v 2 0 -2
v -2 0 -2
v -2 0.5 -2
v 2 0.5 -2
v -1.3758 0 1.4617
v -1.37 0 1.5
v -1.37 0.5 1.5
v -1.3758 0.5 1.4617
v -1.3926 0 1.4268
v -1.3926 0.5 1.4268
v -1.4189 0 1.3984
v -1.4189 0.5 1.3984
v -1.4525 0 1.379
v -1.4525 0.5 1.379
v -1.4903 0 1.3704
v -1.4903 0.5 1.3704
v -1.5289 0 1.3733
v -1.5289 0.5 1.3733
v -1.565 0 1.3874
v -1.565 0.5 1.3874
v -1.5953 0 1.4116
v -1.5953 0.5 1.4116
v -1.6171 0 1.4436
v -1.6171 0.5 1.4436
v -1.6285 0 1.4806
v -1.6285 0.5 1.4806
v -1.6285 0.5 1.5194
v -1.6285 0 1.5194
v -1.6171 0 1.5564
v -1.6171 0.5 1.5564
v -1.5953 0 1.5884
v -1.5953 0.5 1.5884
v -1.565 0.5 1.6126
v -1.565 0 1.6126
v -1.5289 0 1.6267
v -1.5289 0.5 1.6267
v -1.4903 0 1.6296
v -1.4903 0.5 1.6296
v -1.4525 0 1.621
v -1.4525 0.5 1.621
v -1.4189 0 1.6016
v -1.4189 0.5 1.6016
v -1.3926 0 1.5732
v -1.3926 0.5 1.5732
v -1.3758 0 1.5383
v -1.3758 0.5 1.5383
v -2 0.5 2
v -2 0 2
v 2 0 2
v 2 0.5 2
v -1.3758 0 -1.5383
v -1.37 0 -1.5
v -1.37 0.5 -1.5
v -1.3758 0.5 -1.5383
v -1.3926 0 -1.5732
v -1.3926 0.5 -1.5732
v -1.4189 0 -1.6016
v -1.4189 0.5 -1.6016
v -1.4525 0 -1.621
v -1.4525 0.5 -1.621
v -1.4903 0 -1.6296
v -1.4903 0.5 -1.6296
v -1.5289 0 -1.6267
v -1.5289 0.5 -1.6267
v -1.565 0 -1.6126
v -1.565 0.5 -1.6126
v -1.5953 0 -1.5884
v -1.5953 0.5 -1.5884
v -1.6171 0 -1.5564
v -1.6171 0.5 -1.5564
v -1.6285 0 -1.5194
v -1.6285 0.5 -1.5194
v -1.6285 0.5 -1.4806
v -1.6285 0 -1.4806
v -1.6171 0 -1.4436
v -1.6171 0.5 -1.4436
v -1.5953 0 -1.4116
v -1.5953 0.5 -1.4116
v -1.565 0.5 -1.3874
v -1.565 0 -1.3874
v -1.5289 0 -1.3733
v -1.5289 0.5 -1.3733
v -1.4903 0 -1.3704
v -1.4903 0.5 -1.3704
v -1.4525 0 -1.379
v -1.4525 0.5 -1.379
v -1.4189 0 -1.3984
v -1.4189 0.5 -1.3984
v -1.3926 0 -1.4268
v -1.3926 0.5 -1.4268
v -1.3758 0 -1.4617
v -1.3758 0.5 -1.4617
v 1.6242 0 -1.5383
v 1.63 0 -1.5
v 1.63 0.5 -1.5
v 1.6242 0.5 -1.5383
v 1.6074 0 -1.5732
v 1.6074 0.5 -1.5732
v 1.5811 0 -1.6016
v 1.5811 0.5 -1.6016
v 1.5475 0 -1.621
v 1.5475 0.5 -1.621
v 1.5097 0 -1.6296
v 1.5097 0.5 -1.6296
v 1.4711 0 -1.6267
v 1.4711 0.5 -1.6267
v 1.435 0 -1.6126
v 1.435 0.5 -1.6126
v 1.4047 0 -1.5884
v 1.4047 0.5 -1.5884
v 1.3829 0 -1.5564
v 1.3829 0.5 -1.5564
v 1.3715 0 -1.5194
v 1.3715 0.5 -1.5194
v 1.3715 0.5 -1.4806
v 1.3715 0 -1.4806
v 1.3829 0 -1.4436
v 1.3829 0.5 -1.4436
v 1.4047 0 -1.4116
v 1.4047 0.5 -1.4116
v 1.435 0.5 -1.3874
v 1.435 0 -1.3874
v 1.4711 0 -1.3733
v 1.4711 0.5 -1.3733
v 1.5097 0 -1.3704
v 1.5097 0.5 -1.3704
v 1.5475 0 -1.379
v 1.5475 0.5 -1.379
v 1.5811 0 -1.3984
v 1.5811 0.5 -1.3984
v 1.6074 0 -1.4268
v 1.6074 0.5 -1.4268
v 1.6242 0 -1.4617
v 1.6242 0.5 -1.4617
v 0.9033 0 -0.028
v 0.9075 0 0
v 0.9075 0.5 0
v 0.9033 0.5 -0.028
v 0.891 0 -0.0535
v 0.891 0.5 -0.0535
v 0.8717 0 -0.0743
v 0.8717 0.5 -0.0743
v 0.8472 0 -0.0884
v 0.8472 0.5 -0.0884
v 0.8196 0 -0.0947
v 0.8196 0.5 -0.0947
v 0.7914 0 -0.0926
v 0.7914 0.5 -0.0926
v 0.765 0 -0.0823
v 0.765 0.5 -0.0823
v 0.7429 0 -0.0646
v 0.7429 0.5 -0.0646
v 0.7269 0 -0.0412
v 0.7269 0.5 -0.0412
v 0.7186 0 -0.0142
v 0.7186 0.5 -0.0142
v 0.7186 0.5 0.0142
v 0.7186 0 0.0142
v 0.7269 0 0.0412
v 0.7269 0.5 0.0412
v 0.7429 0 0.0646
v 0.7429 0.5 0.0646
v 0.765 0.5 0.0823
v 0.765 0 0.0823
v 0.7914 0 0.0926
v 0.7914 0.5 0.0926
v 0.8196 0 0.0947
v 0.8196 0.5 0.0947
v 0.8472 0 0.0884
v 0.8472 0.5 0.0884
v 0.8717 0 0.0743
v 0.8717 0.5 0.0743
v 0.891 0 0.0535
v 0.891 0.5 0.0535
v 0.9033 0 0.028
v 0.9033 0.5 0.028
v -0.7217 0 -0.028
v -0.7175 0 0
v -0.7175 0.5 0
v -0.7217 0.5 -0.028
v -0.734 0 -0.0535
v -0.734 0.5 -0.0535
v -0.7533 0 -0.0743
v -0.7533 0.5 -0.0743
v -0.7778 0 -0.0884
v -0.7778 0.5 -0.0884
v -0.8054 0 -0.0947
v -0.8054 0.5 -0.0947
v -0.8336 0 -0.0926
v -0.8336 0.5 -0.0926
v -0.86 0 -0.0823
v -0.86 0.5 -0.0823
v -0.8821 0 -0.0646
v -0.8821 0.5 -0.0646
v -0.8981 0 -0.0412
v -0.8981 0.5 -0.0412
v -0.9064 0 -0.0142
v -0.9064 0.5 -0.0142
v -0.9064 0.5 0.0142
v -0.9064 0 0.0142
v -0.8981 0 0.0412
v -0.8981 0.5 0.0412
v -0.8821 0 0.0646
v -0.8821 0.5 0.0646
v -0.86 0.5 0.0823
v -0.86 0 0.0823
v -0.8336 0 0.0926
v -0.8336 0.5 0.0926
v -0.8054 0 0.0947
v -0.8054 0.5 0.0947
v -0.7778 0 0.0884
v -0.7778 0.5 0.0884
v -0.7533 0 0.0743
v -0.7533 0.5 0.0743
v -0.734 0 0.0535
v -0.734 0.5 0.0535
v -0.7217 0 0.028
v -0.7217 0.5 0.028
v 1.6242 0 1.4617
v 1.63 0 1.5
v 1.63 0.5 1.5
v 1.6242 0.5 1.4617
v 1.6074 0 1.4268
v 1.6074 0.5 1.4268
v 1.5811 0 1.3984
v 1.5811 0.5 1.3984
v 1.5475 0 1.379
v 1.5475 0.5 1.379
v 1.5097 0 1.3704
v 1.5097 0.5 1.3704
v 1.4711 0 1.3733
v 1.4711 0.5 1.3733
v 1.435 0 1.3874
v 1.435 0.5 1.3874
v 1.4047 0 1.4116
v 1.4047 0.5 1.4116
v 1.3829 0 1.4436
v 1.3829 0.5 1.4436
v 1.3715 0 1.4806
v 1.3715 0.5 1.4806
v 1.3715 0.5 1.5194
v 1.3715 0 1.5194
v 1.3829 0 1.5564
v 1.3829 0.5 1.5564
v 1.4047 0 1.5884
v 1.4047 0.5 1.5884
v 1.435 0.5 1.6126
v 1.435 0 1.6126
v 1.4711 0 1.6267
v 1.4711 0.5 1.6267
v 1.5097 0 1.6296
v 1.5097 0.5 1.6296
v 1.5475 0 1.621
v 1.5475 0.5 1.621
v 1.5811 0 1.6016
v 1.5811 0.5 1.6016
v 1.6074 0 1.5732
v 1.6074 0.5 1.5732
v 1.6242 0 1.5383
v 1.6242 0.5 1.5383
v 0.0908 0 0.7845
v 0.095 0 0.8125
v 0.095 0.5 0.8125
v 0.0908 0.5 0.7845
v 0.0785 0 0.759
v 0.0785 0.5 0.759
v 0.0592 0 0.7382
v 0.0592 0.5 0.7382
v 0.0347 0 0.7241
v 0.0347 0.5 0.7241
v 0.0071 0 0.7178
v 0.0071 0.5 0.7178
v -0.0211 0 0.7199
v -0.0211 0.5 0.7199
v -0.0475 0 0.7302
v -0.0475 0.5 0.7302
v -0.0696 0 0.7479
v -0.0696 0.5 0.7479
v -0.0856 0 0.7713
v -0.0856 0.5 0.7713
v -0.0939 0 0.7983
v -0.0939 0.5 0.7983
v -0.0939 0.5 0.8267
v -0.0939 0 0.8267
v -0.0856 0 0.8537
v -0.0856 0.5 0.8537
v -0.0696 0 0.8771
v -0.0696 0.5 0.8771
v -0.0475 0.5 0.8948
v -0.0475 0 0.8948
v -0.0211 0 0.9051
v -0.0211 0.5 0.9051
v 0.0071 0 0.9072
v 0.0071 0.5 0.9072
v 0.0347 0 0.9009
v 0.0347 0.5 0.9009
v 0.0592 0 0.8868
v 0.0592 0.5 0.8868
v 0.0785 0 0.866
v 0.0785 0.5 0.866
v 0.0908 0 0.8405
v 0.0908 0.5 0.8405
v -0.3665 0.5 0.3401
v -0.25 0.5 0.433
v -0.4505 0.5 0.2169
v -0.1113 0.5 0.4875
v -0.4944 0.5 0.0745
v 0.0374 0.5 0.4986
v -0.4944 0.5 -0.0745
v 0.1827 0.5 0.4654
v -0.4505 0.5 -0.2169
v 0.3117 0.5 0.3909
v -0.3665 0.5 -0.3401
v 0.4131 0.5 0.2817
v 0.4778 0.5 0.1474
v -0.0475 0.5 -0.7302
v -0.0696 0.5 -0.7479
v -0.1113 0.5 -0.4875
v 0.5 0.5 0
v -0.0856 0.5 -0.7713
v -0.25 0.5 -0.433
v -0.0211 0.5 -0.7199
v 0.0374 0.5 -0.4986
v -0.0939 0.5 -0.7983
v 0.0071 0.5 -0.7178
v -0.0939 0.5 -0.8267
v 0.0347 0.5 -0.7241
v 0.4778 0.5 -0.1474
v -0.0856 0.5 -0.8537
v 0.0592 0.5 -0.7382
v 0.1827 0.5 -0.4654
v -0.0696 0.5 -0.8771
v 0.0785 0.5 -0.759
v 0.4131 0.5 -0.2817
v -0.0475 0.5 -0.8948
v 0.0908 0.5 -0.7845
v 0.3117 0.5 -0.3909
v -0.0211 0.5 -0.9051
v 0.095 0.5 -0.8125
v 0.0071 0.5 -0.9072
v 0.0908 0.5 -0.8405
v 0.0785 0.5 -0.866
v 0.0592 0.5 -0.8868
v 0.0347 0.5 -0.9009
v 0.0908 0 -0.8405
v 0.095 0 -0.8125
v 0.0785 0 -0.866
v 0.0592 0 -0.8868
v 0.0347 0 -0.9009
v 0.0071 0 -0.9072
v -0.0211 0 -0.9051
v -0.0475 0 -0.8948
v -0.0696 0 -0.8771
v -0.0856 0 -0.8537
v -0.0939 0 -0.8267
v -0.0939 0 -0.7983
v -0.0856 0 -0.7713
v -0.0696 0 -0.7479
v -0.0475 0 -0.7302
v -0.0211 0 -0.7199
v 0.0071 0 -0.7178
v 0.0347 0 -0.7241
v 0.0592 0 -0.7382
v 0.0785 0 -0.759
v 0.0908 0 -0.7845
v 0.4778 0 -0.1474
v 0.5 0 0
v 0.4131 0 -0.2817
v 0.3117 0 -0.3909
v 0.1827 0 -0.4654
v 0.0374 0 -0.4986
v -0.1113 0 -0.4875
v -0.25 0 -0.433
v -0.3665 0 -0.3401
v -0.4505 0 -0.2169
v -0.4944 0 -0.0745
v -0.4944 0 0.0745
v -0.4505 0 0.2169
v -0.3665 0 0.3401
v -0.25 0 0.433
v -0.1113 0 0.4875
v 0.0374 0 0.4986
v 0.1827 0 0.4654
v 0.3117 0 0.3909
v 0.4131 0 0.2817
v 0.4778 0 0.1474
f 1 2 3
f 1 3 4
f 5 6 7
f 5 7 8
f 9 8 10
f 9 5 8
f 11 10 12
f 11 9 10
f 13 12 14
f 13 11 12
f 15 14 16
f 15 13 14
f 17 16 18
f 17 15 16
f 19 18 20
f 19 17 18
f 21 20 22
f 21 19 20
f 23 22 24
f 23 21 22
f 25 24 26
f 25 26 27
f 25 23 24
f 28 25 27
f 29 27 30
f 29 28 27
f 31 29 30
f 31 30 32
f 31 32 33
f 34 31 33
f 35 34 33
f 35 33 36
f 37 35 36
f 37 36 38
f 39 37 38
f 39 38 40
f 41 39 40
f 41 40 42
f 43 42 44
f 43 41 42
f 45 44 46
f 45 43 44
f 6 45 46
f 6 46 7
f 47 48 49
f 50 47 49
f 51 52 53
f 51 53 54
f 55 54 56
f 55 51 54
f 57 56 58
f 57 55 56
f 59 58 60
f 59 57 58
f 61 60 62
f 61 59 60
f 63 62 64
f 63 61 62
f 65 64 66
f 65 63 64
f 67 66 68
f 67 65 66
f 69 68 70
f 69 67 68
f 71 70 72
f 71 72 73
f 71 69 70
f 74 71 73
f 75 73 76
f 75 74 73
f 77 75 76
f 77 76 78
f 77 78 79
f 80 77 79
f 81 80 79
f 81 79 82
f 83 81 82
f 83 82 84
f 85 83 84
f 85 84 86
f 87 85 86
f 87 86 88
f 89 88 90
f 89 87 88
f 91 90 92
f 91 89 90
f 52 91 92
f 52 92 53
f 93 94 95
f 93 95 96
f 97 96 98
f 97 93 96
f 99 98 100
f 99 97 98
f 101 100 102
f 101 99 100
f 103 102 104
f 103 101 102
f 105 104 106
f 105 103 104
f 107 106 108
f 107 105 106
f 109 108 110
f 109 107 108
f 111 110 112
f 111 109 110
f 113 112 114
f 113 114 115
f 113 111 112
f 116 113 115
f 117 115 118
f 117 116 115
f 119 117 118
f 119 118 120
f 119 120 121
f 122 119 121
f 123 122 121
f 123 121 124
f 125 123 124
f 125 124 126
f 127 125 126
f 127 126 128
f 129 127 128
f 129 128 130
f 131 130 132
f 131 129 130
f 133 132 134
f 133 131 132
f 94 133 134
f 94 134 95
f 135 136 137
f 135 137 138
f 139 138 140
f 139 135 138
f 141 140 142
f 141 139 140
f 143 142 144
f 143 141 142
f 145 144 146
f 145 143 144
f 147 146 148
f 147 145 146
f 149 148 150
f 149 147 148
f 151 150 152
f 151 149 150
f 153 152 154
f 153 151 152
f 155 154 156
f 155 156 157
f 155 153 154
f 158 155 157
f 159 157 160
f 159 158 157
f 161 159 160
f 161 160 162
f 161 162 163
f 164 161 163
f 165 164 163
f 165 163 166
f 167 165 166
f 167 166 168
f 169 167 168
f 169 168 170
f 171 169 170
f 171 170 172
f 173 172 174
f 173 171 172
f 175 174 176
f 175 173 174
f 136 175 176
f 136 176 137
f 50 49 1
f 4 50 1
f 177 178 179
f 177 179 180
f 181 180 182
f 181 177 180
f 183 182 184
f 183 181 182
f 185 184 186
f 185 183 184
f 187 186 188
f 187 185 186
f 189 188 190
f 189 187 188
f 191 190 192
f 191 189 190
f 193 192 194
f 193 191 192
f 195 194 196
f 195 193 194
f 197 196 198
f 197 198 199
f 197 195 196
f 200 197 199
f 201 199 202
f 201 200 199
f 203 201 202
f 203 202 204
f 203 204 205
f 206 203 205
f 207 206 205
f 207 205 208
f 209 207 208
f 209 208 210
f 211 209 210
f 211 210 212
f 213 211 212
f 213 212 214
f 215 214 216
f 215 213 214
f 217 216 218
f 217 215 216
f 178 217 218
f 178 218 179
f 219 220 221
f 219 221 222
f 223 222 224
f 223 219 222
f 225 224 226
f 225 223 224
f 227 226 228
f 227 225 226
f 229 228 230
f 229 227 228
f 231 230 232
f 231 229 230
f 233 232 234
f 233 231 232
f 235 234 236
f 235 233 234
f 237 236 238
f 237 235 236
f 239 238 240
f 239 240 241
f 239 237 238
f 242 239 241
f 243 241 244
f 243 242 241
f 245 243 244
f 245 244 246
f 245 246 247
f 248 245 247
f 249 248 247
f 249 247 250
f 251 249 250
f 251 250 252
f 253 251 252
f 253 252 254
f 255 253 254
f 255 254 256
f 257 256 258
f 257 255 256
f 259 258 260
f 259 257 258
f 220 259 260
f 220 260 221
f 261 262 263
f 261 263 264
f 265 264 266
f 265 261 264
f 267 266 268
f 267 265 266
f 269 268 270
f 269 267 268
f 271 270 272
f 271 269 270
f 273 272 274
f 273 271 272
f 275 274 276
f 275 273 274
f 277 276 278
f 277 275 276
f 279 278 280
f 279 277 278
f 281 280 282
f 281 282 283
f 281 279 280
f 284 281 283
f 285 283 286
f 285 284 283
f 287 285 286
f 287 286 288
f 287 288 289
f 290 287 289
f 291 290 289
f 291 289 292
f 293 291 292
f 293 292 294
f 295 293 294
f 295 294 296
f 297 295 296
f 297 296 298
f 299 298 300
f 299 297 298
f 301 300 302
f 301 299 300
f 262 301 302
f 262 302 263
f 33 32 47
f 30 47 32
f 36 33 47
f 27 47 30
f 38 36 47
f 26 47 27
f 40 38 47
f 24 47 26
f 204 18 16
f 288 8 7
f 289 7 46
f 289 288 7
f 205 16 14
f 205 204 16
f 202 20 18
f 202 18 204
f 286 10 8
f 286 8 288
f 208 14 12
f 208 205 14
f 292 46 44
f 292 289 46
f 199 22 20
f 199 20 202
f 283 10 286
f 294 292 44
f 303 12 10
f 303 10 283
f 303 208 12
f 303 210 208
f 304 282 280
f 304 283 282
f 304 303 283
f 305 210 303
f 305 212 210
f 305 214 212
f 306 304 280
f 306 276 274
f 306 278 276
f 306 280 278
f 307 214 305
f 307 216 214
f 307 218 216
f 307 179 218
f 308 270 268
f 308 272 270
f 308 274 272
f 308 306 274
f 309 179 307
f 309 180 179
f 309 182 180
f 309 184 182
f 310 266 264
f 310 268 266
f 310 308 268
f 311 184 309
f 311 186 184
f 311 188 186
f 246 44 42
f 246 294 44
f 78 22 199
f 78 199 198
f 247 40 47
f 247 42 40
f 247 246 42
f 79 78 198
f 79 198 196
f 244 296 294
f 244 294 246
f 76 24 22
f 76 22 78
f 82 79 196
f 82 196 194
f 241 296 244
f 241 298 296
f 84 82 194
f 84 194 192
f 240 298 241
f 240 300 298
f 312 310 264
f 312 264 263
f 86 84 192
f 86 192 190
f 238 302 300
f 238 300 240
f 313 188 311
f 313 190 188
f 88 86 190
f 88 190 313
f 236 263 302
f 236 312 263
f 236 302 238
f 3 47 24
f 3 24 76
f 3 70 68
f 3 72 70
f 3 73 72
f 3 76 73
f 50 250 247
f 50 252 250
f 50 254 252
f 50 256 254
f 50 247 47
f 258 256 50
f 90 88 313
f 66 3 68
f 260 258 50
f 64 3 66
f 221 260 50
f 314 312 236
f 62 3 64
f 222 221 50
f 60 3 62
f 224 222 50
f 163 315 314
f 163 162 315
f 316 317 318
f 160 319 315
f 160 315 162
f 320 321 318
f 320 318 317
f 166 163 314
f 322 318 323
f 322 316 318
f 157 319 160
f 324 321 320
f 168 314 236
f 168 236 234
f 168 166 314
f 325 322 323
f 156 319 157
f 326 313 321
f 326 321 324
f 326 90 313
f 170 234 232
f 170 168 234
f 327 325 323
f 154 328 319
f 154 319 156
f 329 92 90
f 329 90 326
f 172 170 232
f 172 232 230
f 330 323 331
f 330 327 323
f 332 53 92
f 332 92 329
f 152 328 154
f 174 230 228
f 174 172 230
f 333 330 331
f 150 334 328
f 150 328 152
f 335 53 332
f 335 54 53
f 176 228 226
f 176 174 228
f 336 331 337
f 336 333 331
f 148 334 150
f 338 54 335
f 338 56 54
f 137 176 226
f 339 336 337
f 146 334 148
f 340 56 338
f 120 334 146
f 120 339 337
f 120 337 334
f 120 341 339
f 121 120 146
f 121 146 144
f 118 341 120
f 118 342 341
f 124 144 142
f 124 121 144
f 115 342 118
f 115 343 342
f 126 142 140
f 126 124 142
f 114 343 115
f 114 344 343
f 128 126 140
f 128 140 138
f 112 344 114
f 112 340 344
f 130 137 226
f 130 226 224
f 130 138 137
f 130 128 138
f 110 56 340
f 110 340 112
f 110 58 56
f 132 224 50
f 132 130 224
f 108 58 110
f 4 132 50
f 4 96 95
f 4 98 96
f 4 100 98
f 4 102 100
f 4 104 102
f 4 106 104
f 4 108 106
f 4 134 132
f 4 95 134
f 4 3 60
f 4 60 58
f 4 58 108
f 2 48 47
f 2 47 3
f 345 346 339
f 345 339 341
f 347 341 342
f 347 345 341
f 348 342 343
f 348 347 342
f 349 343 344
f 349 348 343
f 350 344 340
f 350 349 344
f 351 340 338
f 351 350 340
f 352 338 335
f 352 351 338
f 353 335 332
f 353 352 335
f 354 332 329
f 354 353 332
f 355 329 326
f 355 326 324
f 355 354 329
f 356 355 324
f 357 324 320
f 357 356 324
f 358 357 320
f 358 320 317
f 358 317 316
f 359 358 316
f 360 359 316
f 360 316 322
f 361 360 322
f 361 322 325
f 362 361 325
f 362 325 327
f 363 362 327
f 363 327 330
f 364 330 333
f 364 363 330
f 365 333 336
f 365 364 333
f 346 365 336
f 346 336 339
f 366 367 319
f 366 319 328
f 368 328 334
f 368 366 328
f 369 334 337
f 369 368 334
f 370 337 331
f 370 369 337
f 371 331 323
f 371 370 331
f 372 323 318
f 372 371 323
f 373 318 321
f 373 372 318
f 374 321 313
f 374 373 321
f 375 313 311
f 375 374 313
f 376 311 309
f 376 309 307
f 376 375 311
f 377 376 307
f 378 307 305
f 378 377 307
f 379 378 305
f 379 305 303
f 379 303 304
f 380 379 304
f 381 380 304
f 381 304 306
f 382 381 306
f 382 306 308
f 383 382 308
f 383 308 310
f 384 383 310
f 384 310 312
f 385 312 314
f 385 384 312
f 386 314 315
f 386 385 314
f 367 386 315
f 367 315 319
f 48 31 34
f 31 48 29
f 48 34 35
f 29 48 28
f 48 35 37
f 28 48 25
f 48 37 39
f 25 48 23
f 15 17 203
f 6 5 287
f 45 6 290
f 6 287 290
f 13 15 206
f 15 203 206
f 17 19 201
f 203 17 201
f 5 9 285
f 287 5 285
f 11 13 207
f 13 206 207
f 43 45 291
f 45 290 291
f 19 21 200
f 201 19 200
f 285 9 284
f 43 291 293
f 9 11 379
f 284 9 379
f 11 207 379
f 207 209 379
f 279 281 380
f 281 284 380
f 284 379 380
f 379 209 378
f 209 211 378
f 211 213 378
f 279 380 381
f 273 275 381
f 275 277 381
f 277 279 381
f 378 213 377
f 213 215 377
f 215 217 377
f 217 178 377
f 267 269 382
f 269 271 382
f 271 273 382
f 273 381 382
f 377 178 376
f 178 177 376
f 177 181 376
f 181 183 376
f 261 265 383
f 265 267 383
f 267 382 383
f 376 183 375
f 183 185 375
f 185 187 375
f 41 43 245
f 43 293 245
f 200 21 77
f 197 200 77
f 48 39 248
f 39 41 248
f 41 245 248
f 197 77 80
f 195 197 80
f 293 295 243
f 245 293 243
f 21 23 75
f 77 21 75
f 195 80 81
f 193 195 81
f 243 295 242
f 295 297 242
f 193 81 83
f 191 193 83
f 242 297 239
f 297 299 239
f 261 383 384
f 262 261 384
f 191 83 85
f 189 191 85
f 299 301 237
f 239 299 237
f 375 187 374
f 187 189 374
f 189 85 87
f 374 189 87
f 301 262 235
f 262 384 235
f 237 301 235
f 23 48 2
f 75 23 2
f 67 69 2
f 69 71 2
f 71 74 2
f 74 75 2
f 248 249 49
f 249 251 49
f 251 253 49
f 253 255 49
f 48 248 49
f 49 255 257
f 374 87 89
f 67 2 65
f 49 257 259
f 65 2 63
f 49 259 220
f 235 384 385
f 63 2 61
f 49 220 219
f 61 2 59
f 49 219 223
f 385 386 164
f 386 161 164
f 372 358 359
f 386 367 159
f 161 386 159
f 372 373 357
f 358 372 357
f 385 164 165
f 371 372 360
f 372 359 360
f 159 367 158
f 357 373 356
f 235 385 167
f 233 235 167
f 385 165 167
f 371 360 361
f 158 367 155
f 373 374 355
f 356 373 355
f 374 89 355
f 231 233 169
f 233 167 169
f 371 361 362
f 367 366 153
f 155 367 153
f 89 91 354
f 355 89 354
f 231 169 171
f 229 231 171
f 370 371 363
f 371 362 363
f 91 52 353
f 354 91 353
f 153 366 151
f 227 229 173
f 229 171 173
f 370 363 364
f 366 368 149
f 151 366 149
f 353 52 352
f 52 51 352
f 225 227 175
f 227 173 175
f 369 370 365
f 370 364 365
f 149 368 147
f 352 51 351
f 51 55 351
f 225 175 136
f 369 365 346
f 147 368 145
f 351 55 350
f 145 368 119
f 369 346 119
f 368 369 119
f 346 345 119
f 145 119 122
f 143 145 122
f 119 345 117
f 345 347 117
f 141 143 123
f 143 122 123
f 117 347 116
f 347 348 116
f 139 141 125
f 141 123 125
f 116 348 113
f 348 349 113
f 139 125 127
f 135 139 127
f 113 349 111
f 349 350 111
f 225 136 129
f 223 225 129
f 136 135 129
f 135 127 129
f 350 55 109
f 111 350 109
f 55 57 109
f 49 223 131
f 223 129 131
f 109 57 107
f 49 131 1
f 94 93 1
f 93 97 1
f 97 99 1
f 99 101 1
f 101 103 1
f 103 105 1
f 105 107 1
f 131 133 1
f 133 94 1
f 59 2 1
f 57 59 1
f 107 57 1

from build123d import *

# Parameters (mm, degrees)
SKETCH1_W           = 4
SKETCH1_H           = 4
SKETCH1_R           = 0.5
SKETCH1_R_2         = 0.095
SKETCH1_R_3         = 0.13
BOSS_EXTRUDE1_DEPTH = 0.5


with BuildPart() as part:
    # Sketch1 → Boss-Extrude1 (new body)
    with BuildSketch(Plane(origin=(0, 0, 0), x_dir=(1, 0, 0), z_dir=(0, 1, 0))):
        Rectangle(SKETCH1_W, SKETCH1_H)
        Circle(SKETCH1_R, mode=Mode.SUBTRACT)
        with Locations((0, 0.8125)):
            Circle(SKETCH1_R_2, mode=Mode.SUBTRACT)
        with Locations((0.8125, 0)):
            Circle(SKETCH1_R_2, mode=Mode.SUBTRACT)
        with Locations((0, -0.8125)):
            Circle(SKETCH1_R_2, mode=Mode.SUBTRACT)
        with Locations((-0.8125, 0)):
            Circle(SKETCH1_R_2, mode=Mode.SUBTRACT)
        with Locations((-1.5, 1.5)):
            Circle(SKETCH1_R_3, mode=Mode.SUBTRACT)
        with Locations((1.5, 1.5)):
            Circle(SKETCH1_R_3, mode=Mode.SUBTRACT)
        with Locations((-1.5, -1.5)):
            Circle(SKETCH1_R_3, mode=Mode.SUBTRACT)
        with Locations((1.5, -1.5)):
            Circle(SKETCH1_R_3, mode=Mode.SUBTRACT)
    extrude(amount=BOSS_EXTRUDE1_DEPTH)


solid = part.part
